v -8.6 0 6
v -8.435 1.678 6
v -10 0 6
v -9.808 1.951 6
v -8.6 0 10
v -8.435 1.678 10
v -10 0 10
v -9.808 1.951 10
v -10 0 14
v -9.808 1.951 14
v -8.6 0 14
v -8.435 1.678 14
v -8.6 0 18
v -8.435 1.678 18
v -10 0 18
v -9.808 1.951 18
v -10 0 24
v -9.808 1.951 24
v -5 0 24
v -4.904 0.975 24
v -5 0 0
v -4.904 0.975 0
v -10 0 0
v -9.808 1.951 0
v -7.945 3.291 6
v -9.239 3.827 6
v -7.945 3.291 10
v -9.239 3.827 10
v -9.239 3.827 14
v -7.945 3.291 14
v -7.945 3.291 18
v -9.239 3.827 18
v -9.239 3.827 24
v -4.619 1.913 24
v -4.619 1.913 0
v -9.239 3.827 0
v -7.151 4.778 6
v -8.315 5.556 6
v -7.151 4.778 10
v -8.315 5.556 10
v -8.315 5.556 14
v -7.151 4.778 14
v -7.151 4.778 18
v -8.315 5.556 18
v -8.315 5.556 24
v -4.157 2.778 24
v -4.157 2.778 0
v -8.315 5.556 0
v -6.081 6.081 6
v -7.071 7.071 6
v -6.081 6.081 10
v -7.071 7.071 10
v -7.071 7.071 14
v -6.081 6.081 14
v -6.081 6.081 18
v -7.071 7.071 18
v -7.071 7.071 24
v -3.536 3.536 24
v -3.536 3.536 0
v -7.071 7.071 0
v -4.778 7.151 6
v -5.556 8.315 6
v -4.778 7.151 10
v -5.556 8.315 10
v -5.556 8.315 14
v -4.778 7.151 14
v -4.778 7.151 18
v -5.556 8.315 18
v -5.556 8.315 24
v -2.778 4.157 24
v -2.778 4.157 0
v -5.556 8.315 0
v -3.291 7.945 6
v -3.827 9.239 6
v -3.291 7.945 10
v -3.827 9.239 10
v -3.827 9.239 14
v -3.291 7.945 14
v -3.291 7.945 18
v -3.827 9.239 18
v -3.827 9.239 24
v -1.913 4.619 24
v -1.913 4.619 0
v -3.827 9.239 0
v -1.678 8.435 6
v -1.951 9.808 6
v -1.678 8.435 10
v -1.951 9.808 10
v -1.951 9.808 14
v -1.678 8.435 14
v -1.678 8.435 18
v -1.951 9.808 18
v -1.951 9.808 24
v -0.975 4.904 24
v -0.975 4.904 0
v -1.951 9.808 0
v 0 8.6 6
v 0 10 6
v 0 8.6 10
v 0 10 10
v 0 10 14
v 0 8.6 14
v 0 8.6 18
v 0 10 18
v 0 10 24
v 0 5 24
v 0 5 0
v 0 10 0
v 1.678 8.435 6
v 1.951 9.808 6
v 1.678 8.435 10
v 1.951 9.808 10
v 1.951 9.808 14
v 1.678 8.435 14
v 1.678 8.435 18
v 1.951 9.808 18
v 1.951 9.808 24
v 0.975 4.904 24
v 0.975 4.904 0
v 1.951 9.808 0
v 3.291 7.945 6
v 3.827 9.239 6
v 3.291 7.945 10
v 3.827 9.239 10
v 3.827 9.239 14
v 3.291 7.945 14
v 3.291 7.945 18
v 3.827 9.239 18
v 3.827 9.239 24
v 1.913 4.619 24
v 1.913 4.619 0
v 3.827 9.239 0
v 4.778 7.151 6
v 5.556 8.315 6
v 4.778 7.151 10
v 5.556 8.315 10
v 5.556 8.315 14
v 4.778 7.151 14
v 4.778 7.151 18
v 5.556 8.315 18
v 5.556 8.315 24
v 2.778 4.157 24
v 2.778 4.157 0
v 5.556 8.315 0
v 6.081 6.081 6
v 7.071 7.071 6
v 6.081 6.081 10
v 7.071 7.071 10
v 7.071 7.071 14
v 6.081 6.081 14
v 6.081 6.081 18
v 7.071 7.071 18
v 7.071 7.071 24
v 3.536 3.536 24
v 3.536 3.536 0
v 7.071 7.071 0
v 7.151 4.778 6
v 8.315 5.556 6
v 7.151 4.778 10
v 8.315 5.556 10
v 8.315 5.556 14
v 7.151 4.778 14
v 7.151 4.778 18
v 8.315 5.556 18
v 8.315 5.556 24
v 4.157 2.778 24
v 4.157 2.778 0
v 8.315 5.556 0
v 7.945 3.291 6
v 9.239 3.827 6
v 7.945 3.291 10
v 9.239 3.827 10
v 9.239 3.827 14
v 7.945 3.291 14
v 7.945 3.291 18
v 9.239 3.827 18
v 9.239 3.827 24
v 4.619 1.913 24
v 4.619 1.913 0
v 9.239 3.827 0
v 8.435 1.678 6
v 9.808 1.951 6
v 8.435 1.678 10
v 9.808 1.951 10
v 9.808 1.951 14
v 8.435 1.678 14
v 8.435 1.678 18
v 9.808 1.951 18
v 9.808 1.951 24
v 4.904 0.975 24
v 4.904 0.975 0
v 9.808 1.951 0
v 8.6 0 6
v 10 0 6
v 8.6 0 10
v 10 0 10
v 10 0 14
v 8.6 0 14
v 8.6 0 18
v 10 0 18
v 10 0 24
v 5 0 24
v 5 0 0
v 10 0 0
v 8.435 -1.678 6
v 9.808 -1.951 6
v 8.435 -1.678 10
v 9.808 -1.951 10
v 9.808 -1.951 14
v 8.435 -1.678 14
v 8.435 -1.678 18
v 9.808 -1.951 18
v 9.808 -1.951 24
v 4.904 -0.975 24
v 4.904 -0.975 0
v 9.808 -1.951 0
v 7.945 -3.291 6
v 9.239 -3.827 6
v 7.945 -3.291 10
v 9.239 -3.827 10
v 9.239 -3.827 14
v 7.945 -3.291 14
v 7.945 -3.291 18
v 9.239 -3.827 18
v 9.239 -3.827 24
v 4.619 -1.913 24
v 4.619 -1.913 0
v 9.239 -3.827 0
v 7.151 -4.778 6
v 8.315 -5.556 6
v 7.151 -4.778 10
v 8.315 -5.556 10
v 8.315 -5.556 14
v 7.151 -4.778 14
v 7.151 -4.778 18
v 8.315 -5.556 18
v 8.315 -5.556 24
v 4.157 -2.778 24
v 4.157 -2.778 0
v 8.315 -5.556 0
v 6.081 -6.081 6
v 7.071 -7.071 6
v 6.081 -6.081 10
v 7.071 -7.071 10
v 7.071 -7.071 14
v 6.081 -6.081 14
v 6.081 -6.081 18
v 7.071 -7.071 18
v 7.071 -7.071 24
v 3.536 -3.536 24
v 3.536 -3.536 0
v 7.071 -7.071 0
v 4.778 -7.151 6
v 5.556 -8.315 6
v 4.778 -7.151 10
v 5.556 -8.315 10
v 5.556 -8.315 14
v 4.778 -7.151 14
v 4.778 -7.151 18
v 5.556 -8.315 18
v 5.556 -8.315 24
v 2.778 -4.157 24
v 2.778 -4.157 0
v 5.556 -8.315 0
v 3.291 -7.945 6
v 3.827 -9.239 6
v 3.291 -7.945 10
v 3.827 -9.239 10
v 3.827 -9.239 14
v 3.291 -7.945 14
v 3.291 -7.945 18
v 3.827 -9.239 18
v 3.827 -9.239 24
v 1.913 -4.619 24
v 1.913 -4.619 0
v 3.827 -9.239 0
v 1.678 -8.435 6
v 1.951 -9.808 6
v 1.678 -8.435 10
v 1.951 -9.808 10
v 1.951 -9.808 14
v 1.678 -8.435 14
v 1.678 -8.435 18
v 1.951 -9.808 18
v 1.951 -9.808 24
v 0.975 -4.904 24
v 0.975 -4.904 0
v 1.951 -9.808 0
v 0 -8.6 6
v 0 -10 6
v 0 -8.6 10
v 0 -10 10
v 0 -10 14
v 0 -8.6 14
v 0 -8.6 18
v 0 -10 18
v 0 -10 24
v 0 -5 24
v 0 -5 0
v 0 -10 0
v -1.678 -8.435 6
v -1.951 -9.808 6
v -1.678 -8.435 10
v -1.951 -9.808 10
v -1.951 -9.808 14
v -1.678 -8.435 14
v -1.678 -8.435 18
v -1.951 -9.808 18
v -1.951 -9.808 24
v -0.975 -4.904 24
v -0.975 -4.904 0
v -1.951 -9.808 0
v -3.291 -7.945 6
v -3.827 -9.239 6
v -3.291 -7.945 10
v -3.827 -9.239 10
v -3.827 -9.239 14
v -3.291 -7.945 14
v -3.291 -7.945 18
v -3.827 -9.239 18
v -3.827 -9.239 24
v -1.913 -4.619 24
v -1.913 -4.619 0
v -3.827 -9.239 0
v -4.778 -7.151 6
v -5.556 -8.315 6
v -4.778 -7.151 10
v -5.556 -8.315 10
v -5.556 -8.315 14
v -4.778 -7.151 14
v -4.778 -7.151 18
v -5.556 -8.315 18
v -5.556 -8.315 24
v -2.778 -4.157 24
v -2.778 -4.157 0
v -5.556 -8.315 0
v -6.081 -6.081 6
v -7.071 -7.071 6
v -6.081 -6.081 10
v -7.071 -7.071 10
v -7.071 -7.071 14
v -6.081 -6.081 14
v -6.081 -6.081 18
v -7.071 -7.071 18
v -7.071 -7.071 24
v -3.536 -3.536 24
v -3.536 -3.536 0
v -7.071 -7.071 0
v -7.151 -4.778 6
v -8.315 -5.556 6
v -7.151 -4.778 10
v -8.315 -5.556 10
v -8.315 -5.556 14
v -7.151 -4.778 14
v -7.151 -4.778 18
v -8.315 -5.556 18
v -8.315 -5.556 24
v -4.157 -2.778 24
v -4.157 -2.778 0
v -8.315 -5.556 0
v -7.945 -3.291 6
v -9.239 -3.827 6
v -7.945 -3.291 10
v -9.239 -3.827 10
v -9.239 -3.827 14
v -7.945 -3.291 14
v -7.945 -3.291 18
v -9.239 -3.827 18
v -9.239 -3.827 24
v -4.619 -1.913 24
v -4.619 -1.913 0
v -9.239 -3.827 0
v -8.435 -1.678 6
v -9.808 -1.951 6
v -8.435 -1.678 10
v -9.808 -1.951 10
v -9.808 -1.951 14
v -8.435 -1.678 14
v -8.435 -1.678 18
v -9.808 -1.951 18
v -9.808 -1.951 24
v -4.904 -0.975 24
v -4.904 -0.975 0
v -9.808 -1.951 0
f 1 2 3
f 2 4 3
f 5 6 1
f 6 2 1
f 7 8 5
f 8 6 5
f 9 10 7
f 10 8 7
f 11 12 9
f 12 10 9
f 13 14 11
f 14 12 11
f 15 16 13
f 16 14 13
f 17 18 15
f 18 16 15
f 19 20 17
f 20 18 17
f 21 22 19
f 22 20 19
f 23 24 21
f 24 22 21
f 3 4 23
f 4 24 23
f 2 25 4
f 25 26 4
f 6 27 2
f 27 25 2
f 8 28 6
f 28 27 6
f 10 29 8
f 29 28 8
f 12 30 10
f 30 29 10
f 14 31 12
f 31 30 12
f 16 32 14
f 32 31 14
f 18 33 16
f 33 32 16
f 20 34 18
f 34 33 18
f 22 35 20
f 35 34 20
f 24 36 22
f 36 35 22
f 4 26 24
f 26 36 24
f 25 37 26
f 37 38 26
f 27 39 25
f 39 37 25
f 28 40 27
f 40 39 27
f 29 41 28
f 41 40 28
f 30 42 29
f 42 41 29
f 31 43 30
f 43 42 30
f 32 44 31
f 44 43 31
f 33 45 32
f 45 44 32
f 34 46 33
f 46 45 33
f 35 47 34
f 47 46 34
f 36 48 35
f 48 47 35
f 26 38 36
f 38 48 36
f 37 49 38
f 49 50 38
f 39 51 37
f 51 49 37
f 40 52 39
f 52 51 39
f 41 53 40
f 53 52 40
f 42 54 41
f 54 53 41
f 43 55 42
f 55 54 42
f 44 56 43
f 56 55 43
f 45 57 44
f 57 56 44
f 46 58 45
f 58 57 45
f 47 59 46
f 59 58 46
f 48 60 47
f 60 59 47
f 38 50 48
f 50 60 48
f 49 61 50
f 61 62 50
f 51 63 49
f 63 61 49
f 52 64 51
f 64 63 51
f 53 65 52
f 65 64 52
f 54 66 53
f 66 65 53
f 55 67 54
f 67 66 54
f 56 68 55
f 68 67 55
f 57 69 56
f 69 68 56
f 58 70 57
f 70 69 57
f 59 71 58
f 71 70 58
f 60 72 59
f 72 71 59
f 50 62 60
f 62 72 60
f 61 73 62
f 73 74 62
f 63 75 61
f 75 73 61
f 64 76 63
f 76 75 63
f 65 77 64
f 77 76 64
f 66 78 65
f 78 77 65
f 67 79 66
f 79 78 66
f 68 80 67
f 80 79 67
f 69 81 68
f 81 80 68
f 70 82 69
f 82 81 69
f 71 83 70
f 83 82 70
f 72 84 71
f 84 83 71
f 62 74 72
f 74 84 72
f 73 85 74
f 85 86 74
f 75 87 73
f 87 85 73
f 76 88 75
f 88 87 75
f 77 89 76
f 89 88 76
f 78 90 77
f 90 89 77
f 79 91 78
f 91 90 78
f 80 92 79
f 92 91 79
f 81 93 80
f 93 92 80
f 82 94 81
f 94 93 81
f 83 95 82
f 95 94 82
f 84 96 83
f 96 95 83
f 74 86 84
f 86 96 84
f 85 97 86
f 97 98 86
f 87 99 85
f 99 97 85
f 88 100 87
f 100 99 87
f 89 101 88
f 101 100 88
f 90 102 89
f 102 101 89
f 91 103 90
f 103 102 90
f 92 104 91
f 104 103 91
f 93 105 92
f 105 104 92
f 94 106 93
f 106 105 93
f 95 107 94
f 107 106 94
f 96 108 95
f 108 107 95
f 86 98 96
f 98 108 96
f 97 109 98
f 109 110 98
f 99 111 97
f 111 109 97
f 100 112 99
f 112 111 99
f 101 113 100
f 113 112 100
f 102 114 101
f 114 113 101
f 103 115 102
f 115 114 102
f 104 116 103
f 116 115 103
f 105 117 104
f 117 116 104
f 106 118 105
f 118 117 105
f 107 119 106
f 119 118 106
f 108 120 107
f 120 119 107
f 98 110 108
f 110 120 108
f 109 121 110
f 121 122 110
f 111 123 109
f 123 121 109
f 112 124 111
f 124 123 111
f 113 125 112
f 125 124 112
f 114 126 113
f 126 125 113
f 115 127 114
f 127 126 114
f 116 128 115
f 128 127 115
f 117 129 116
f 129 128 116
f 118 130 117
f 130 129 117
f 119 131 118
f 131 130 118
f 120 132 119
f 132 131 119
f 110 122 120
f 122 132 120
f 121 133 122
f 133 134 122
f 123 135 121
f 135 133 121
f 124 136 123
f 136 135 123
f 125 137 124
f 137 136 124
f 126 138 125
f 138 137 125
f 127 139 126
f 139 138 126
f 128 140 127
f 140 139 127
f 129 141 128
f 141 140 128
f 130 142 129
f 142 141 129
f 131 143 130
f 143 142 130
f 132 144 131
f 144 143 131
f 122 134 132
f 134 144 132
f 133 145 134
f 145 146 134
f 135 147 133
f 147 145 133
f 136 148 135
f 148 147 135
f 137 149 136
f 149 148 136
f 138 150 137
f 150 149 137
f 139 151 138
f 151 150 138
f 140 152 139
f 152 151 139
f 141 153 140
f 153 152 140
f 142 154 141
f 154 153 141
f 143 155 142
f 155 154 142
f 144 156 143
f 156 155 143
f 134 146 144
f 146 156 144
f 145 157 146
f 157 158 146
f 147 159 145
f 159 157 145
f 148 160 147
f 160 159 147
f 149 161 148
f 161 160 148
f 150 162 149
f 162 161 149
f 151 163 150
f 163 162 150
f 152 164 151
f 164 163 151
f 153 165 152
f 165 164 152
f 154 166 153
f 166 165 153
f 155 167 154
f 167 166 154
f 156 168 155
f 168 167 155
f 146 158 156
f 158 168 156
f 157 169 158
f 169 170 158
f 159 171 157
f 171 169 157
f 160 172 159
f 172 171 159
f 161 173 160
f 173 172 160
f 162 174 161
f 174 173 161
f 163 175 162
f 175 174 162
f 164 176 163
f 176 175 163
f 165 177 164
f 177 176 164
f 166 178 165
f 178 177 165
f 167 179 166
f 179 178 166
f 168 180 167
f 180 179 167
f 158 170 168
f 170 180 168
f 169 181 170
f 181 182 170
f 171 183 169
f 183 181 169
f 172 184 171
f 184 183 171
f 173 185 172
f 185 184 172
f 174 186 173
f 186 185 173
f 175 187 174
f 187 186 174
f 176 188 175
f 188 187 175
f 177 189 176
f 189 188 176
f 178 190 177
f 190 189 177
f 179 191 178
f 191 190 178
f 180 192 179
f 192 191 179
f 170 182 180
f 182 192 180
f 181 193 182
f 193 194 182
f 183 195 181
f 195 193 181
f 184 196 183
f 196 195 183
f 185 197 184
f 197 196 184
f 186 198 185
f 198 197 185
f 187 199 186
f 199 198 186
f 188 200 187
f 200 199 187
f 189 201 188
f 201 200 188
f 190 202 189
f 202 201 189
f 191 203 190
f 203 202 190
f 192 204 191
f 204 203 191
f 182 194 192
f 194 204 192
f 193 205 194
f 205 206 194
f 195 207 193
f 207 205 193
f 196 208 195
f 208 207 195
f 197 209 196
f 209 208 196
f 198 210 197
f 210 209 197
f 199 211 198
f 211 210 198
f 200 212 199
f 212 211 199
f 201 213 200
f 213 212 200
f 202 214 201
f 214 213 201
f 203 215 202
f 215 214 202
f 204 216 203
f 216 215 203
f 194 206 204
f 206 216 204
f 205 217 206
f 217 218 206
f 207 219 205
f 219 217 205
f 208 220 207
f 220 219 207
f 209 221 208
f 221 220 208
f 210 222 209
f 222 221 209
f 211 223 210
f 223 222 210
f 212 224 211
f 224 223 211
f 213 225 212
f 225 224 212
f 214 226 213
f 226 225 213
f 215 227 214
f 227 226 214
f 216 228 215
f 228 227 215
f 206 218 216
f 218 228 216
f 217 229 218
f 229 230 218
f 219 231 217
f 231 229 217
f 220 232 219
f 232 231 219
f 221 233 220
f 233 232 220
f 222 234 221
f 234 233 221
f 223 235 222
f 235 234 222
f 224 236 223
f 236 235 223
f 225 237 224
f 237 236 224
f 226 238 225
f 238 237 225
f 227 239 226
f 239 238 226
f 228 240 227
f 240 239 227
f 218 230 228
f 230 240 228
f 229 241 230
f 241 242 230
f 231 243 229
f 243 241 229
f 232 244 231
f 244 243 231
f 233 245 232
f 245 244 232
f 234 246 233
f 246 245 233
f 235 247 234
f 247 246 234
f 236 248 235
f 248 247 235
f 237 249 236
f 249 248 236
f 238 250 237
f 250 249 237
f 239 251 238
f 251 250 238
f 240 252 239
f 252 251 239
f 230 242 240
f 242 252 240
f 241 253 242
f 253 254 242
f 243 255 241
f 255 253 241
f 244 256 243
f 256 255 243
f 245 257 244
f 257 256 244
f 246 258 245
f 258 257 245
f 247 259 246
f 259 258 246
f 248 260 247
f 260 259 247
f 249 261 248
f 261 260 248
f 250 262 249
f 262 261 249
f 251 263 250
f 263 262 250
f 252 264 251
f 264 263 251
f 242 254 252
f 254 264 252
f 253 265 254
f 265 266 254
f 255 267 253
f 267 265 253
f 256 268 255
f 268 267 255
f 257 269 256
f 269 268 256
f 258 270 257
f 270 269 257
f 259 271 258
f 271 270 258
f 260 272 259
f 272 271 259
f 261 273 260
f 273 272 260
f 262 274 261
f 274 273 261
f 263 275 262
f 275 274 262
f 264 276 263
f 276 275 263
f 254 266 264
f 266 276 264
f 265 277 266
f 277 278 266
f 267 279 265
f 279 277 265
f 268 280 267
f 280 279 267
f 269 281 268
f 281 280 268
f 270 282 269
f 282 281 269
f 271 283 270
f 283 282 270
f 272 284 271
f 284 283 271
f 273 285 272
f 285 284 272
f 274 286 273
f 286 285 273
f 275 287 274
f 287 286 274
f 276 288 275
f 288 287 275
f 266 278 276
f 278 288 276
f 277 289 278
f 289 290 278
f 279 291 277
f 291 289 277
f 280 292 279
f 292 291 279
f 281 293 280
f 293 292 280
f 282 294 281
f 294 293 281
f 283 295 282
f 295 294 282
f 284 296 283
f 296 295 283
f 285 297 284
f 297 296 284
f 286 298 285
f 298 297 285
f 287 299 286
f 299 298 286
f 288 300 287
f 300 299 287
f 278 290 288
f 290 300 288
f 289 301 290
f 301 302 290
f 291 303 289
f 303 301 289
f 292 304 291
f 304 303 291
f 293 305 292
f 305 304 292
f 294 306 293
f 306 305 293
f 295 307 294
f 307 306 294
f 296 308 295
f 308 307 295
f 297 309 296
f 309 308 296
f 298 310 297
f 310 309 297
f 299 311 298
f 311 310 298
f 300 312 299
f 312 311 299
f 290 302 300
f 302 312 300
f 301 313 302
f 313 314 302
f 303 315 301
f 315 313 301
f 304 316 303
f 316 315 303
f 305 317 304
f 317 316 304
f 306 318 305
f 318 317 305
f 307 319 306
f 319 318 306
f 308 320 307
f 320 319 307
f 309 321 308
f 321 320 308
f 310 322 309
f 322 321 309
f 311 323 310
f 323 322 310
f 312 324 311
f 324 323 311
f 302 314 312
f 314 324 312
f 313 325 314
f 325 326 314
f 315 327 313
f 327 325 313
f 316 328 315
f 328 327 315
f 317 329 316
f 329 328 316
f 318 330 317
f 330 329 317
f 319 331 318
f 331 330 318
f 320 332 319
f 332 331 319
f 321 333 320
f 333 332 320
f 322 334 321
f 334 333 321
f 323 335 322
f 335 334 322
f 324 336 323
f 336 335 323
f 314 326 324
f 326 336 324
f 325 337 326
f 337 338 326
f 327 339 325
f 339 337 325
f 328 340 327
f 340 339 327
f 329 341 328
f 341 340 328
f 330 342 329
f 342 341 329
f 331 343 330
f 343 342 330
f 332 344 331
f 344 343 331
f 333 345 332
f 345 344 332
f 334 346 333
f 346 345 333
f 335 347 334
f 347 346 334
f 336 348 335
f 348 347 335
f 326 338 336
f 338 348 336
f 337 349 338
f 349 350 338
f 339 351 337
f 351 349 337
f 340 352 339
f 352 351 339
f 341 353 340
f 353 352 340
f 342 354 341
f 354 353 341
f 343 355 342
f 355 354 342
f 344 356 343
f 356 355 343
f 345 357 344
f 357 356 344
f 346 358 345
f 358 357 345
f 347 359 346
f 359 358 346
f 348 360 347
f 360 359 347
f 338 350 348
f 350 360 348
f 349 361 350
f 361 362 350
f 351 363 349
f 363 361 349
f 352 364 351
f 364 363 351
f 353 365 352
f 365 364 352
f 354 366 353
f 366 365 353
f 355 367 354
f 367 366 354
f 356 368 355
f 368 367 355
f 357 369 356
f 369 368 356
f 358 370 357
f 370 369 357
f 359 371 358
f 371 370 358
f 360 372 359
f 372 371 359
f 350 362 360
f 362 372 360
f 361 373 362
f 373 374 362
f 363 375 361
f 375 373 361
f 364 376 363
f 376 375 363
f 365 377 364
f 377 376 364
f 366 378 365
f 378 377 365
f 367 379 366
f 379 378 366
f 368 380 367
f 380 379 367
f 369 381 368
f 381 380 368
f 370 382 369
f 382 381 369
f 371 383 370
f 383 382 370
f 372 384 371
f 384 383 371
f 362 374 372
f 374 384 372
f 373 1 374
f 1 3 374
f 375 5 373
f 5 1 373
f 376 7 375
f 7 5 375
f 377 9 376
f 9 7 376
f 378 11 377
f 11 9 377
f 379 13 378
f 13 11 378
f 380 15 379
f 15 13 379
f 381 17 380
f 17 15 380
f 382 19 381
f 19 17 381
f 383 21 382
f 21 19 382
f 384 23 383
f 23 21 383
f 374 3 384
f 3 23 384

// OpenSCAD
$fn = 32;

// ----------------------------------------------------------------------
// Grooved revolve: plain_grooves, bore R5
// ----------------------------------------------------------------------

// --- parameters (mm) ---
bore_r = 5;               // bore radius
outer_r = 10;             // outer radius of the body
total_h = 24;             // overall height, Z
wall = 5;                 // radial wall thickness
groove_w = 4;             // groove width
groove_d = 1.4;           // groove depth
grooves = 2;              // number of outer grooves
fit_tol = 0.05;           // declared fit tolerance (prompt contract)
free_tol = 0.2;           // declared free tolerance (prompt contract)

bbox_x = 2 * outer_r;  // full diameter
bore_d = 2 * bore_r;  // bore diameter
body_d = 2 * outer_r;  // body diameter
revolve_angle = 360;  // full turn around the Z axis

profile = [[5, 0], [10, 0], [10, 6], [8.6, 6], [8.6, 10], [10, 10], [10, 14], [8.6, 14], [8.6, 18], [10, 18], [10, 24], [5, 24]];  // primary outline, 12 points, counter clockwise

// --- the one profile operation ---
rotate_extrude(angle = revolve_angle) polygon(points = profile);
